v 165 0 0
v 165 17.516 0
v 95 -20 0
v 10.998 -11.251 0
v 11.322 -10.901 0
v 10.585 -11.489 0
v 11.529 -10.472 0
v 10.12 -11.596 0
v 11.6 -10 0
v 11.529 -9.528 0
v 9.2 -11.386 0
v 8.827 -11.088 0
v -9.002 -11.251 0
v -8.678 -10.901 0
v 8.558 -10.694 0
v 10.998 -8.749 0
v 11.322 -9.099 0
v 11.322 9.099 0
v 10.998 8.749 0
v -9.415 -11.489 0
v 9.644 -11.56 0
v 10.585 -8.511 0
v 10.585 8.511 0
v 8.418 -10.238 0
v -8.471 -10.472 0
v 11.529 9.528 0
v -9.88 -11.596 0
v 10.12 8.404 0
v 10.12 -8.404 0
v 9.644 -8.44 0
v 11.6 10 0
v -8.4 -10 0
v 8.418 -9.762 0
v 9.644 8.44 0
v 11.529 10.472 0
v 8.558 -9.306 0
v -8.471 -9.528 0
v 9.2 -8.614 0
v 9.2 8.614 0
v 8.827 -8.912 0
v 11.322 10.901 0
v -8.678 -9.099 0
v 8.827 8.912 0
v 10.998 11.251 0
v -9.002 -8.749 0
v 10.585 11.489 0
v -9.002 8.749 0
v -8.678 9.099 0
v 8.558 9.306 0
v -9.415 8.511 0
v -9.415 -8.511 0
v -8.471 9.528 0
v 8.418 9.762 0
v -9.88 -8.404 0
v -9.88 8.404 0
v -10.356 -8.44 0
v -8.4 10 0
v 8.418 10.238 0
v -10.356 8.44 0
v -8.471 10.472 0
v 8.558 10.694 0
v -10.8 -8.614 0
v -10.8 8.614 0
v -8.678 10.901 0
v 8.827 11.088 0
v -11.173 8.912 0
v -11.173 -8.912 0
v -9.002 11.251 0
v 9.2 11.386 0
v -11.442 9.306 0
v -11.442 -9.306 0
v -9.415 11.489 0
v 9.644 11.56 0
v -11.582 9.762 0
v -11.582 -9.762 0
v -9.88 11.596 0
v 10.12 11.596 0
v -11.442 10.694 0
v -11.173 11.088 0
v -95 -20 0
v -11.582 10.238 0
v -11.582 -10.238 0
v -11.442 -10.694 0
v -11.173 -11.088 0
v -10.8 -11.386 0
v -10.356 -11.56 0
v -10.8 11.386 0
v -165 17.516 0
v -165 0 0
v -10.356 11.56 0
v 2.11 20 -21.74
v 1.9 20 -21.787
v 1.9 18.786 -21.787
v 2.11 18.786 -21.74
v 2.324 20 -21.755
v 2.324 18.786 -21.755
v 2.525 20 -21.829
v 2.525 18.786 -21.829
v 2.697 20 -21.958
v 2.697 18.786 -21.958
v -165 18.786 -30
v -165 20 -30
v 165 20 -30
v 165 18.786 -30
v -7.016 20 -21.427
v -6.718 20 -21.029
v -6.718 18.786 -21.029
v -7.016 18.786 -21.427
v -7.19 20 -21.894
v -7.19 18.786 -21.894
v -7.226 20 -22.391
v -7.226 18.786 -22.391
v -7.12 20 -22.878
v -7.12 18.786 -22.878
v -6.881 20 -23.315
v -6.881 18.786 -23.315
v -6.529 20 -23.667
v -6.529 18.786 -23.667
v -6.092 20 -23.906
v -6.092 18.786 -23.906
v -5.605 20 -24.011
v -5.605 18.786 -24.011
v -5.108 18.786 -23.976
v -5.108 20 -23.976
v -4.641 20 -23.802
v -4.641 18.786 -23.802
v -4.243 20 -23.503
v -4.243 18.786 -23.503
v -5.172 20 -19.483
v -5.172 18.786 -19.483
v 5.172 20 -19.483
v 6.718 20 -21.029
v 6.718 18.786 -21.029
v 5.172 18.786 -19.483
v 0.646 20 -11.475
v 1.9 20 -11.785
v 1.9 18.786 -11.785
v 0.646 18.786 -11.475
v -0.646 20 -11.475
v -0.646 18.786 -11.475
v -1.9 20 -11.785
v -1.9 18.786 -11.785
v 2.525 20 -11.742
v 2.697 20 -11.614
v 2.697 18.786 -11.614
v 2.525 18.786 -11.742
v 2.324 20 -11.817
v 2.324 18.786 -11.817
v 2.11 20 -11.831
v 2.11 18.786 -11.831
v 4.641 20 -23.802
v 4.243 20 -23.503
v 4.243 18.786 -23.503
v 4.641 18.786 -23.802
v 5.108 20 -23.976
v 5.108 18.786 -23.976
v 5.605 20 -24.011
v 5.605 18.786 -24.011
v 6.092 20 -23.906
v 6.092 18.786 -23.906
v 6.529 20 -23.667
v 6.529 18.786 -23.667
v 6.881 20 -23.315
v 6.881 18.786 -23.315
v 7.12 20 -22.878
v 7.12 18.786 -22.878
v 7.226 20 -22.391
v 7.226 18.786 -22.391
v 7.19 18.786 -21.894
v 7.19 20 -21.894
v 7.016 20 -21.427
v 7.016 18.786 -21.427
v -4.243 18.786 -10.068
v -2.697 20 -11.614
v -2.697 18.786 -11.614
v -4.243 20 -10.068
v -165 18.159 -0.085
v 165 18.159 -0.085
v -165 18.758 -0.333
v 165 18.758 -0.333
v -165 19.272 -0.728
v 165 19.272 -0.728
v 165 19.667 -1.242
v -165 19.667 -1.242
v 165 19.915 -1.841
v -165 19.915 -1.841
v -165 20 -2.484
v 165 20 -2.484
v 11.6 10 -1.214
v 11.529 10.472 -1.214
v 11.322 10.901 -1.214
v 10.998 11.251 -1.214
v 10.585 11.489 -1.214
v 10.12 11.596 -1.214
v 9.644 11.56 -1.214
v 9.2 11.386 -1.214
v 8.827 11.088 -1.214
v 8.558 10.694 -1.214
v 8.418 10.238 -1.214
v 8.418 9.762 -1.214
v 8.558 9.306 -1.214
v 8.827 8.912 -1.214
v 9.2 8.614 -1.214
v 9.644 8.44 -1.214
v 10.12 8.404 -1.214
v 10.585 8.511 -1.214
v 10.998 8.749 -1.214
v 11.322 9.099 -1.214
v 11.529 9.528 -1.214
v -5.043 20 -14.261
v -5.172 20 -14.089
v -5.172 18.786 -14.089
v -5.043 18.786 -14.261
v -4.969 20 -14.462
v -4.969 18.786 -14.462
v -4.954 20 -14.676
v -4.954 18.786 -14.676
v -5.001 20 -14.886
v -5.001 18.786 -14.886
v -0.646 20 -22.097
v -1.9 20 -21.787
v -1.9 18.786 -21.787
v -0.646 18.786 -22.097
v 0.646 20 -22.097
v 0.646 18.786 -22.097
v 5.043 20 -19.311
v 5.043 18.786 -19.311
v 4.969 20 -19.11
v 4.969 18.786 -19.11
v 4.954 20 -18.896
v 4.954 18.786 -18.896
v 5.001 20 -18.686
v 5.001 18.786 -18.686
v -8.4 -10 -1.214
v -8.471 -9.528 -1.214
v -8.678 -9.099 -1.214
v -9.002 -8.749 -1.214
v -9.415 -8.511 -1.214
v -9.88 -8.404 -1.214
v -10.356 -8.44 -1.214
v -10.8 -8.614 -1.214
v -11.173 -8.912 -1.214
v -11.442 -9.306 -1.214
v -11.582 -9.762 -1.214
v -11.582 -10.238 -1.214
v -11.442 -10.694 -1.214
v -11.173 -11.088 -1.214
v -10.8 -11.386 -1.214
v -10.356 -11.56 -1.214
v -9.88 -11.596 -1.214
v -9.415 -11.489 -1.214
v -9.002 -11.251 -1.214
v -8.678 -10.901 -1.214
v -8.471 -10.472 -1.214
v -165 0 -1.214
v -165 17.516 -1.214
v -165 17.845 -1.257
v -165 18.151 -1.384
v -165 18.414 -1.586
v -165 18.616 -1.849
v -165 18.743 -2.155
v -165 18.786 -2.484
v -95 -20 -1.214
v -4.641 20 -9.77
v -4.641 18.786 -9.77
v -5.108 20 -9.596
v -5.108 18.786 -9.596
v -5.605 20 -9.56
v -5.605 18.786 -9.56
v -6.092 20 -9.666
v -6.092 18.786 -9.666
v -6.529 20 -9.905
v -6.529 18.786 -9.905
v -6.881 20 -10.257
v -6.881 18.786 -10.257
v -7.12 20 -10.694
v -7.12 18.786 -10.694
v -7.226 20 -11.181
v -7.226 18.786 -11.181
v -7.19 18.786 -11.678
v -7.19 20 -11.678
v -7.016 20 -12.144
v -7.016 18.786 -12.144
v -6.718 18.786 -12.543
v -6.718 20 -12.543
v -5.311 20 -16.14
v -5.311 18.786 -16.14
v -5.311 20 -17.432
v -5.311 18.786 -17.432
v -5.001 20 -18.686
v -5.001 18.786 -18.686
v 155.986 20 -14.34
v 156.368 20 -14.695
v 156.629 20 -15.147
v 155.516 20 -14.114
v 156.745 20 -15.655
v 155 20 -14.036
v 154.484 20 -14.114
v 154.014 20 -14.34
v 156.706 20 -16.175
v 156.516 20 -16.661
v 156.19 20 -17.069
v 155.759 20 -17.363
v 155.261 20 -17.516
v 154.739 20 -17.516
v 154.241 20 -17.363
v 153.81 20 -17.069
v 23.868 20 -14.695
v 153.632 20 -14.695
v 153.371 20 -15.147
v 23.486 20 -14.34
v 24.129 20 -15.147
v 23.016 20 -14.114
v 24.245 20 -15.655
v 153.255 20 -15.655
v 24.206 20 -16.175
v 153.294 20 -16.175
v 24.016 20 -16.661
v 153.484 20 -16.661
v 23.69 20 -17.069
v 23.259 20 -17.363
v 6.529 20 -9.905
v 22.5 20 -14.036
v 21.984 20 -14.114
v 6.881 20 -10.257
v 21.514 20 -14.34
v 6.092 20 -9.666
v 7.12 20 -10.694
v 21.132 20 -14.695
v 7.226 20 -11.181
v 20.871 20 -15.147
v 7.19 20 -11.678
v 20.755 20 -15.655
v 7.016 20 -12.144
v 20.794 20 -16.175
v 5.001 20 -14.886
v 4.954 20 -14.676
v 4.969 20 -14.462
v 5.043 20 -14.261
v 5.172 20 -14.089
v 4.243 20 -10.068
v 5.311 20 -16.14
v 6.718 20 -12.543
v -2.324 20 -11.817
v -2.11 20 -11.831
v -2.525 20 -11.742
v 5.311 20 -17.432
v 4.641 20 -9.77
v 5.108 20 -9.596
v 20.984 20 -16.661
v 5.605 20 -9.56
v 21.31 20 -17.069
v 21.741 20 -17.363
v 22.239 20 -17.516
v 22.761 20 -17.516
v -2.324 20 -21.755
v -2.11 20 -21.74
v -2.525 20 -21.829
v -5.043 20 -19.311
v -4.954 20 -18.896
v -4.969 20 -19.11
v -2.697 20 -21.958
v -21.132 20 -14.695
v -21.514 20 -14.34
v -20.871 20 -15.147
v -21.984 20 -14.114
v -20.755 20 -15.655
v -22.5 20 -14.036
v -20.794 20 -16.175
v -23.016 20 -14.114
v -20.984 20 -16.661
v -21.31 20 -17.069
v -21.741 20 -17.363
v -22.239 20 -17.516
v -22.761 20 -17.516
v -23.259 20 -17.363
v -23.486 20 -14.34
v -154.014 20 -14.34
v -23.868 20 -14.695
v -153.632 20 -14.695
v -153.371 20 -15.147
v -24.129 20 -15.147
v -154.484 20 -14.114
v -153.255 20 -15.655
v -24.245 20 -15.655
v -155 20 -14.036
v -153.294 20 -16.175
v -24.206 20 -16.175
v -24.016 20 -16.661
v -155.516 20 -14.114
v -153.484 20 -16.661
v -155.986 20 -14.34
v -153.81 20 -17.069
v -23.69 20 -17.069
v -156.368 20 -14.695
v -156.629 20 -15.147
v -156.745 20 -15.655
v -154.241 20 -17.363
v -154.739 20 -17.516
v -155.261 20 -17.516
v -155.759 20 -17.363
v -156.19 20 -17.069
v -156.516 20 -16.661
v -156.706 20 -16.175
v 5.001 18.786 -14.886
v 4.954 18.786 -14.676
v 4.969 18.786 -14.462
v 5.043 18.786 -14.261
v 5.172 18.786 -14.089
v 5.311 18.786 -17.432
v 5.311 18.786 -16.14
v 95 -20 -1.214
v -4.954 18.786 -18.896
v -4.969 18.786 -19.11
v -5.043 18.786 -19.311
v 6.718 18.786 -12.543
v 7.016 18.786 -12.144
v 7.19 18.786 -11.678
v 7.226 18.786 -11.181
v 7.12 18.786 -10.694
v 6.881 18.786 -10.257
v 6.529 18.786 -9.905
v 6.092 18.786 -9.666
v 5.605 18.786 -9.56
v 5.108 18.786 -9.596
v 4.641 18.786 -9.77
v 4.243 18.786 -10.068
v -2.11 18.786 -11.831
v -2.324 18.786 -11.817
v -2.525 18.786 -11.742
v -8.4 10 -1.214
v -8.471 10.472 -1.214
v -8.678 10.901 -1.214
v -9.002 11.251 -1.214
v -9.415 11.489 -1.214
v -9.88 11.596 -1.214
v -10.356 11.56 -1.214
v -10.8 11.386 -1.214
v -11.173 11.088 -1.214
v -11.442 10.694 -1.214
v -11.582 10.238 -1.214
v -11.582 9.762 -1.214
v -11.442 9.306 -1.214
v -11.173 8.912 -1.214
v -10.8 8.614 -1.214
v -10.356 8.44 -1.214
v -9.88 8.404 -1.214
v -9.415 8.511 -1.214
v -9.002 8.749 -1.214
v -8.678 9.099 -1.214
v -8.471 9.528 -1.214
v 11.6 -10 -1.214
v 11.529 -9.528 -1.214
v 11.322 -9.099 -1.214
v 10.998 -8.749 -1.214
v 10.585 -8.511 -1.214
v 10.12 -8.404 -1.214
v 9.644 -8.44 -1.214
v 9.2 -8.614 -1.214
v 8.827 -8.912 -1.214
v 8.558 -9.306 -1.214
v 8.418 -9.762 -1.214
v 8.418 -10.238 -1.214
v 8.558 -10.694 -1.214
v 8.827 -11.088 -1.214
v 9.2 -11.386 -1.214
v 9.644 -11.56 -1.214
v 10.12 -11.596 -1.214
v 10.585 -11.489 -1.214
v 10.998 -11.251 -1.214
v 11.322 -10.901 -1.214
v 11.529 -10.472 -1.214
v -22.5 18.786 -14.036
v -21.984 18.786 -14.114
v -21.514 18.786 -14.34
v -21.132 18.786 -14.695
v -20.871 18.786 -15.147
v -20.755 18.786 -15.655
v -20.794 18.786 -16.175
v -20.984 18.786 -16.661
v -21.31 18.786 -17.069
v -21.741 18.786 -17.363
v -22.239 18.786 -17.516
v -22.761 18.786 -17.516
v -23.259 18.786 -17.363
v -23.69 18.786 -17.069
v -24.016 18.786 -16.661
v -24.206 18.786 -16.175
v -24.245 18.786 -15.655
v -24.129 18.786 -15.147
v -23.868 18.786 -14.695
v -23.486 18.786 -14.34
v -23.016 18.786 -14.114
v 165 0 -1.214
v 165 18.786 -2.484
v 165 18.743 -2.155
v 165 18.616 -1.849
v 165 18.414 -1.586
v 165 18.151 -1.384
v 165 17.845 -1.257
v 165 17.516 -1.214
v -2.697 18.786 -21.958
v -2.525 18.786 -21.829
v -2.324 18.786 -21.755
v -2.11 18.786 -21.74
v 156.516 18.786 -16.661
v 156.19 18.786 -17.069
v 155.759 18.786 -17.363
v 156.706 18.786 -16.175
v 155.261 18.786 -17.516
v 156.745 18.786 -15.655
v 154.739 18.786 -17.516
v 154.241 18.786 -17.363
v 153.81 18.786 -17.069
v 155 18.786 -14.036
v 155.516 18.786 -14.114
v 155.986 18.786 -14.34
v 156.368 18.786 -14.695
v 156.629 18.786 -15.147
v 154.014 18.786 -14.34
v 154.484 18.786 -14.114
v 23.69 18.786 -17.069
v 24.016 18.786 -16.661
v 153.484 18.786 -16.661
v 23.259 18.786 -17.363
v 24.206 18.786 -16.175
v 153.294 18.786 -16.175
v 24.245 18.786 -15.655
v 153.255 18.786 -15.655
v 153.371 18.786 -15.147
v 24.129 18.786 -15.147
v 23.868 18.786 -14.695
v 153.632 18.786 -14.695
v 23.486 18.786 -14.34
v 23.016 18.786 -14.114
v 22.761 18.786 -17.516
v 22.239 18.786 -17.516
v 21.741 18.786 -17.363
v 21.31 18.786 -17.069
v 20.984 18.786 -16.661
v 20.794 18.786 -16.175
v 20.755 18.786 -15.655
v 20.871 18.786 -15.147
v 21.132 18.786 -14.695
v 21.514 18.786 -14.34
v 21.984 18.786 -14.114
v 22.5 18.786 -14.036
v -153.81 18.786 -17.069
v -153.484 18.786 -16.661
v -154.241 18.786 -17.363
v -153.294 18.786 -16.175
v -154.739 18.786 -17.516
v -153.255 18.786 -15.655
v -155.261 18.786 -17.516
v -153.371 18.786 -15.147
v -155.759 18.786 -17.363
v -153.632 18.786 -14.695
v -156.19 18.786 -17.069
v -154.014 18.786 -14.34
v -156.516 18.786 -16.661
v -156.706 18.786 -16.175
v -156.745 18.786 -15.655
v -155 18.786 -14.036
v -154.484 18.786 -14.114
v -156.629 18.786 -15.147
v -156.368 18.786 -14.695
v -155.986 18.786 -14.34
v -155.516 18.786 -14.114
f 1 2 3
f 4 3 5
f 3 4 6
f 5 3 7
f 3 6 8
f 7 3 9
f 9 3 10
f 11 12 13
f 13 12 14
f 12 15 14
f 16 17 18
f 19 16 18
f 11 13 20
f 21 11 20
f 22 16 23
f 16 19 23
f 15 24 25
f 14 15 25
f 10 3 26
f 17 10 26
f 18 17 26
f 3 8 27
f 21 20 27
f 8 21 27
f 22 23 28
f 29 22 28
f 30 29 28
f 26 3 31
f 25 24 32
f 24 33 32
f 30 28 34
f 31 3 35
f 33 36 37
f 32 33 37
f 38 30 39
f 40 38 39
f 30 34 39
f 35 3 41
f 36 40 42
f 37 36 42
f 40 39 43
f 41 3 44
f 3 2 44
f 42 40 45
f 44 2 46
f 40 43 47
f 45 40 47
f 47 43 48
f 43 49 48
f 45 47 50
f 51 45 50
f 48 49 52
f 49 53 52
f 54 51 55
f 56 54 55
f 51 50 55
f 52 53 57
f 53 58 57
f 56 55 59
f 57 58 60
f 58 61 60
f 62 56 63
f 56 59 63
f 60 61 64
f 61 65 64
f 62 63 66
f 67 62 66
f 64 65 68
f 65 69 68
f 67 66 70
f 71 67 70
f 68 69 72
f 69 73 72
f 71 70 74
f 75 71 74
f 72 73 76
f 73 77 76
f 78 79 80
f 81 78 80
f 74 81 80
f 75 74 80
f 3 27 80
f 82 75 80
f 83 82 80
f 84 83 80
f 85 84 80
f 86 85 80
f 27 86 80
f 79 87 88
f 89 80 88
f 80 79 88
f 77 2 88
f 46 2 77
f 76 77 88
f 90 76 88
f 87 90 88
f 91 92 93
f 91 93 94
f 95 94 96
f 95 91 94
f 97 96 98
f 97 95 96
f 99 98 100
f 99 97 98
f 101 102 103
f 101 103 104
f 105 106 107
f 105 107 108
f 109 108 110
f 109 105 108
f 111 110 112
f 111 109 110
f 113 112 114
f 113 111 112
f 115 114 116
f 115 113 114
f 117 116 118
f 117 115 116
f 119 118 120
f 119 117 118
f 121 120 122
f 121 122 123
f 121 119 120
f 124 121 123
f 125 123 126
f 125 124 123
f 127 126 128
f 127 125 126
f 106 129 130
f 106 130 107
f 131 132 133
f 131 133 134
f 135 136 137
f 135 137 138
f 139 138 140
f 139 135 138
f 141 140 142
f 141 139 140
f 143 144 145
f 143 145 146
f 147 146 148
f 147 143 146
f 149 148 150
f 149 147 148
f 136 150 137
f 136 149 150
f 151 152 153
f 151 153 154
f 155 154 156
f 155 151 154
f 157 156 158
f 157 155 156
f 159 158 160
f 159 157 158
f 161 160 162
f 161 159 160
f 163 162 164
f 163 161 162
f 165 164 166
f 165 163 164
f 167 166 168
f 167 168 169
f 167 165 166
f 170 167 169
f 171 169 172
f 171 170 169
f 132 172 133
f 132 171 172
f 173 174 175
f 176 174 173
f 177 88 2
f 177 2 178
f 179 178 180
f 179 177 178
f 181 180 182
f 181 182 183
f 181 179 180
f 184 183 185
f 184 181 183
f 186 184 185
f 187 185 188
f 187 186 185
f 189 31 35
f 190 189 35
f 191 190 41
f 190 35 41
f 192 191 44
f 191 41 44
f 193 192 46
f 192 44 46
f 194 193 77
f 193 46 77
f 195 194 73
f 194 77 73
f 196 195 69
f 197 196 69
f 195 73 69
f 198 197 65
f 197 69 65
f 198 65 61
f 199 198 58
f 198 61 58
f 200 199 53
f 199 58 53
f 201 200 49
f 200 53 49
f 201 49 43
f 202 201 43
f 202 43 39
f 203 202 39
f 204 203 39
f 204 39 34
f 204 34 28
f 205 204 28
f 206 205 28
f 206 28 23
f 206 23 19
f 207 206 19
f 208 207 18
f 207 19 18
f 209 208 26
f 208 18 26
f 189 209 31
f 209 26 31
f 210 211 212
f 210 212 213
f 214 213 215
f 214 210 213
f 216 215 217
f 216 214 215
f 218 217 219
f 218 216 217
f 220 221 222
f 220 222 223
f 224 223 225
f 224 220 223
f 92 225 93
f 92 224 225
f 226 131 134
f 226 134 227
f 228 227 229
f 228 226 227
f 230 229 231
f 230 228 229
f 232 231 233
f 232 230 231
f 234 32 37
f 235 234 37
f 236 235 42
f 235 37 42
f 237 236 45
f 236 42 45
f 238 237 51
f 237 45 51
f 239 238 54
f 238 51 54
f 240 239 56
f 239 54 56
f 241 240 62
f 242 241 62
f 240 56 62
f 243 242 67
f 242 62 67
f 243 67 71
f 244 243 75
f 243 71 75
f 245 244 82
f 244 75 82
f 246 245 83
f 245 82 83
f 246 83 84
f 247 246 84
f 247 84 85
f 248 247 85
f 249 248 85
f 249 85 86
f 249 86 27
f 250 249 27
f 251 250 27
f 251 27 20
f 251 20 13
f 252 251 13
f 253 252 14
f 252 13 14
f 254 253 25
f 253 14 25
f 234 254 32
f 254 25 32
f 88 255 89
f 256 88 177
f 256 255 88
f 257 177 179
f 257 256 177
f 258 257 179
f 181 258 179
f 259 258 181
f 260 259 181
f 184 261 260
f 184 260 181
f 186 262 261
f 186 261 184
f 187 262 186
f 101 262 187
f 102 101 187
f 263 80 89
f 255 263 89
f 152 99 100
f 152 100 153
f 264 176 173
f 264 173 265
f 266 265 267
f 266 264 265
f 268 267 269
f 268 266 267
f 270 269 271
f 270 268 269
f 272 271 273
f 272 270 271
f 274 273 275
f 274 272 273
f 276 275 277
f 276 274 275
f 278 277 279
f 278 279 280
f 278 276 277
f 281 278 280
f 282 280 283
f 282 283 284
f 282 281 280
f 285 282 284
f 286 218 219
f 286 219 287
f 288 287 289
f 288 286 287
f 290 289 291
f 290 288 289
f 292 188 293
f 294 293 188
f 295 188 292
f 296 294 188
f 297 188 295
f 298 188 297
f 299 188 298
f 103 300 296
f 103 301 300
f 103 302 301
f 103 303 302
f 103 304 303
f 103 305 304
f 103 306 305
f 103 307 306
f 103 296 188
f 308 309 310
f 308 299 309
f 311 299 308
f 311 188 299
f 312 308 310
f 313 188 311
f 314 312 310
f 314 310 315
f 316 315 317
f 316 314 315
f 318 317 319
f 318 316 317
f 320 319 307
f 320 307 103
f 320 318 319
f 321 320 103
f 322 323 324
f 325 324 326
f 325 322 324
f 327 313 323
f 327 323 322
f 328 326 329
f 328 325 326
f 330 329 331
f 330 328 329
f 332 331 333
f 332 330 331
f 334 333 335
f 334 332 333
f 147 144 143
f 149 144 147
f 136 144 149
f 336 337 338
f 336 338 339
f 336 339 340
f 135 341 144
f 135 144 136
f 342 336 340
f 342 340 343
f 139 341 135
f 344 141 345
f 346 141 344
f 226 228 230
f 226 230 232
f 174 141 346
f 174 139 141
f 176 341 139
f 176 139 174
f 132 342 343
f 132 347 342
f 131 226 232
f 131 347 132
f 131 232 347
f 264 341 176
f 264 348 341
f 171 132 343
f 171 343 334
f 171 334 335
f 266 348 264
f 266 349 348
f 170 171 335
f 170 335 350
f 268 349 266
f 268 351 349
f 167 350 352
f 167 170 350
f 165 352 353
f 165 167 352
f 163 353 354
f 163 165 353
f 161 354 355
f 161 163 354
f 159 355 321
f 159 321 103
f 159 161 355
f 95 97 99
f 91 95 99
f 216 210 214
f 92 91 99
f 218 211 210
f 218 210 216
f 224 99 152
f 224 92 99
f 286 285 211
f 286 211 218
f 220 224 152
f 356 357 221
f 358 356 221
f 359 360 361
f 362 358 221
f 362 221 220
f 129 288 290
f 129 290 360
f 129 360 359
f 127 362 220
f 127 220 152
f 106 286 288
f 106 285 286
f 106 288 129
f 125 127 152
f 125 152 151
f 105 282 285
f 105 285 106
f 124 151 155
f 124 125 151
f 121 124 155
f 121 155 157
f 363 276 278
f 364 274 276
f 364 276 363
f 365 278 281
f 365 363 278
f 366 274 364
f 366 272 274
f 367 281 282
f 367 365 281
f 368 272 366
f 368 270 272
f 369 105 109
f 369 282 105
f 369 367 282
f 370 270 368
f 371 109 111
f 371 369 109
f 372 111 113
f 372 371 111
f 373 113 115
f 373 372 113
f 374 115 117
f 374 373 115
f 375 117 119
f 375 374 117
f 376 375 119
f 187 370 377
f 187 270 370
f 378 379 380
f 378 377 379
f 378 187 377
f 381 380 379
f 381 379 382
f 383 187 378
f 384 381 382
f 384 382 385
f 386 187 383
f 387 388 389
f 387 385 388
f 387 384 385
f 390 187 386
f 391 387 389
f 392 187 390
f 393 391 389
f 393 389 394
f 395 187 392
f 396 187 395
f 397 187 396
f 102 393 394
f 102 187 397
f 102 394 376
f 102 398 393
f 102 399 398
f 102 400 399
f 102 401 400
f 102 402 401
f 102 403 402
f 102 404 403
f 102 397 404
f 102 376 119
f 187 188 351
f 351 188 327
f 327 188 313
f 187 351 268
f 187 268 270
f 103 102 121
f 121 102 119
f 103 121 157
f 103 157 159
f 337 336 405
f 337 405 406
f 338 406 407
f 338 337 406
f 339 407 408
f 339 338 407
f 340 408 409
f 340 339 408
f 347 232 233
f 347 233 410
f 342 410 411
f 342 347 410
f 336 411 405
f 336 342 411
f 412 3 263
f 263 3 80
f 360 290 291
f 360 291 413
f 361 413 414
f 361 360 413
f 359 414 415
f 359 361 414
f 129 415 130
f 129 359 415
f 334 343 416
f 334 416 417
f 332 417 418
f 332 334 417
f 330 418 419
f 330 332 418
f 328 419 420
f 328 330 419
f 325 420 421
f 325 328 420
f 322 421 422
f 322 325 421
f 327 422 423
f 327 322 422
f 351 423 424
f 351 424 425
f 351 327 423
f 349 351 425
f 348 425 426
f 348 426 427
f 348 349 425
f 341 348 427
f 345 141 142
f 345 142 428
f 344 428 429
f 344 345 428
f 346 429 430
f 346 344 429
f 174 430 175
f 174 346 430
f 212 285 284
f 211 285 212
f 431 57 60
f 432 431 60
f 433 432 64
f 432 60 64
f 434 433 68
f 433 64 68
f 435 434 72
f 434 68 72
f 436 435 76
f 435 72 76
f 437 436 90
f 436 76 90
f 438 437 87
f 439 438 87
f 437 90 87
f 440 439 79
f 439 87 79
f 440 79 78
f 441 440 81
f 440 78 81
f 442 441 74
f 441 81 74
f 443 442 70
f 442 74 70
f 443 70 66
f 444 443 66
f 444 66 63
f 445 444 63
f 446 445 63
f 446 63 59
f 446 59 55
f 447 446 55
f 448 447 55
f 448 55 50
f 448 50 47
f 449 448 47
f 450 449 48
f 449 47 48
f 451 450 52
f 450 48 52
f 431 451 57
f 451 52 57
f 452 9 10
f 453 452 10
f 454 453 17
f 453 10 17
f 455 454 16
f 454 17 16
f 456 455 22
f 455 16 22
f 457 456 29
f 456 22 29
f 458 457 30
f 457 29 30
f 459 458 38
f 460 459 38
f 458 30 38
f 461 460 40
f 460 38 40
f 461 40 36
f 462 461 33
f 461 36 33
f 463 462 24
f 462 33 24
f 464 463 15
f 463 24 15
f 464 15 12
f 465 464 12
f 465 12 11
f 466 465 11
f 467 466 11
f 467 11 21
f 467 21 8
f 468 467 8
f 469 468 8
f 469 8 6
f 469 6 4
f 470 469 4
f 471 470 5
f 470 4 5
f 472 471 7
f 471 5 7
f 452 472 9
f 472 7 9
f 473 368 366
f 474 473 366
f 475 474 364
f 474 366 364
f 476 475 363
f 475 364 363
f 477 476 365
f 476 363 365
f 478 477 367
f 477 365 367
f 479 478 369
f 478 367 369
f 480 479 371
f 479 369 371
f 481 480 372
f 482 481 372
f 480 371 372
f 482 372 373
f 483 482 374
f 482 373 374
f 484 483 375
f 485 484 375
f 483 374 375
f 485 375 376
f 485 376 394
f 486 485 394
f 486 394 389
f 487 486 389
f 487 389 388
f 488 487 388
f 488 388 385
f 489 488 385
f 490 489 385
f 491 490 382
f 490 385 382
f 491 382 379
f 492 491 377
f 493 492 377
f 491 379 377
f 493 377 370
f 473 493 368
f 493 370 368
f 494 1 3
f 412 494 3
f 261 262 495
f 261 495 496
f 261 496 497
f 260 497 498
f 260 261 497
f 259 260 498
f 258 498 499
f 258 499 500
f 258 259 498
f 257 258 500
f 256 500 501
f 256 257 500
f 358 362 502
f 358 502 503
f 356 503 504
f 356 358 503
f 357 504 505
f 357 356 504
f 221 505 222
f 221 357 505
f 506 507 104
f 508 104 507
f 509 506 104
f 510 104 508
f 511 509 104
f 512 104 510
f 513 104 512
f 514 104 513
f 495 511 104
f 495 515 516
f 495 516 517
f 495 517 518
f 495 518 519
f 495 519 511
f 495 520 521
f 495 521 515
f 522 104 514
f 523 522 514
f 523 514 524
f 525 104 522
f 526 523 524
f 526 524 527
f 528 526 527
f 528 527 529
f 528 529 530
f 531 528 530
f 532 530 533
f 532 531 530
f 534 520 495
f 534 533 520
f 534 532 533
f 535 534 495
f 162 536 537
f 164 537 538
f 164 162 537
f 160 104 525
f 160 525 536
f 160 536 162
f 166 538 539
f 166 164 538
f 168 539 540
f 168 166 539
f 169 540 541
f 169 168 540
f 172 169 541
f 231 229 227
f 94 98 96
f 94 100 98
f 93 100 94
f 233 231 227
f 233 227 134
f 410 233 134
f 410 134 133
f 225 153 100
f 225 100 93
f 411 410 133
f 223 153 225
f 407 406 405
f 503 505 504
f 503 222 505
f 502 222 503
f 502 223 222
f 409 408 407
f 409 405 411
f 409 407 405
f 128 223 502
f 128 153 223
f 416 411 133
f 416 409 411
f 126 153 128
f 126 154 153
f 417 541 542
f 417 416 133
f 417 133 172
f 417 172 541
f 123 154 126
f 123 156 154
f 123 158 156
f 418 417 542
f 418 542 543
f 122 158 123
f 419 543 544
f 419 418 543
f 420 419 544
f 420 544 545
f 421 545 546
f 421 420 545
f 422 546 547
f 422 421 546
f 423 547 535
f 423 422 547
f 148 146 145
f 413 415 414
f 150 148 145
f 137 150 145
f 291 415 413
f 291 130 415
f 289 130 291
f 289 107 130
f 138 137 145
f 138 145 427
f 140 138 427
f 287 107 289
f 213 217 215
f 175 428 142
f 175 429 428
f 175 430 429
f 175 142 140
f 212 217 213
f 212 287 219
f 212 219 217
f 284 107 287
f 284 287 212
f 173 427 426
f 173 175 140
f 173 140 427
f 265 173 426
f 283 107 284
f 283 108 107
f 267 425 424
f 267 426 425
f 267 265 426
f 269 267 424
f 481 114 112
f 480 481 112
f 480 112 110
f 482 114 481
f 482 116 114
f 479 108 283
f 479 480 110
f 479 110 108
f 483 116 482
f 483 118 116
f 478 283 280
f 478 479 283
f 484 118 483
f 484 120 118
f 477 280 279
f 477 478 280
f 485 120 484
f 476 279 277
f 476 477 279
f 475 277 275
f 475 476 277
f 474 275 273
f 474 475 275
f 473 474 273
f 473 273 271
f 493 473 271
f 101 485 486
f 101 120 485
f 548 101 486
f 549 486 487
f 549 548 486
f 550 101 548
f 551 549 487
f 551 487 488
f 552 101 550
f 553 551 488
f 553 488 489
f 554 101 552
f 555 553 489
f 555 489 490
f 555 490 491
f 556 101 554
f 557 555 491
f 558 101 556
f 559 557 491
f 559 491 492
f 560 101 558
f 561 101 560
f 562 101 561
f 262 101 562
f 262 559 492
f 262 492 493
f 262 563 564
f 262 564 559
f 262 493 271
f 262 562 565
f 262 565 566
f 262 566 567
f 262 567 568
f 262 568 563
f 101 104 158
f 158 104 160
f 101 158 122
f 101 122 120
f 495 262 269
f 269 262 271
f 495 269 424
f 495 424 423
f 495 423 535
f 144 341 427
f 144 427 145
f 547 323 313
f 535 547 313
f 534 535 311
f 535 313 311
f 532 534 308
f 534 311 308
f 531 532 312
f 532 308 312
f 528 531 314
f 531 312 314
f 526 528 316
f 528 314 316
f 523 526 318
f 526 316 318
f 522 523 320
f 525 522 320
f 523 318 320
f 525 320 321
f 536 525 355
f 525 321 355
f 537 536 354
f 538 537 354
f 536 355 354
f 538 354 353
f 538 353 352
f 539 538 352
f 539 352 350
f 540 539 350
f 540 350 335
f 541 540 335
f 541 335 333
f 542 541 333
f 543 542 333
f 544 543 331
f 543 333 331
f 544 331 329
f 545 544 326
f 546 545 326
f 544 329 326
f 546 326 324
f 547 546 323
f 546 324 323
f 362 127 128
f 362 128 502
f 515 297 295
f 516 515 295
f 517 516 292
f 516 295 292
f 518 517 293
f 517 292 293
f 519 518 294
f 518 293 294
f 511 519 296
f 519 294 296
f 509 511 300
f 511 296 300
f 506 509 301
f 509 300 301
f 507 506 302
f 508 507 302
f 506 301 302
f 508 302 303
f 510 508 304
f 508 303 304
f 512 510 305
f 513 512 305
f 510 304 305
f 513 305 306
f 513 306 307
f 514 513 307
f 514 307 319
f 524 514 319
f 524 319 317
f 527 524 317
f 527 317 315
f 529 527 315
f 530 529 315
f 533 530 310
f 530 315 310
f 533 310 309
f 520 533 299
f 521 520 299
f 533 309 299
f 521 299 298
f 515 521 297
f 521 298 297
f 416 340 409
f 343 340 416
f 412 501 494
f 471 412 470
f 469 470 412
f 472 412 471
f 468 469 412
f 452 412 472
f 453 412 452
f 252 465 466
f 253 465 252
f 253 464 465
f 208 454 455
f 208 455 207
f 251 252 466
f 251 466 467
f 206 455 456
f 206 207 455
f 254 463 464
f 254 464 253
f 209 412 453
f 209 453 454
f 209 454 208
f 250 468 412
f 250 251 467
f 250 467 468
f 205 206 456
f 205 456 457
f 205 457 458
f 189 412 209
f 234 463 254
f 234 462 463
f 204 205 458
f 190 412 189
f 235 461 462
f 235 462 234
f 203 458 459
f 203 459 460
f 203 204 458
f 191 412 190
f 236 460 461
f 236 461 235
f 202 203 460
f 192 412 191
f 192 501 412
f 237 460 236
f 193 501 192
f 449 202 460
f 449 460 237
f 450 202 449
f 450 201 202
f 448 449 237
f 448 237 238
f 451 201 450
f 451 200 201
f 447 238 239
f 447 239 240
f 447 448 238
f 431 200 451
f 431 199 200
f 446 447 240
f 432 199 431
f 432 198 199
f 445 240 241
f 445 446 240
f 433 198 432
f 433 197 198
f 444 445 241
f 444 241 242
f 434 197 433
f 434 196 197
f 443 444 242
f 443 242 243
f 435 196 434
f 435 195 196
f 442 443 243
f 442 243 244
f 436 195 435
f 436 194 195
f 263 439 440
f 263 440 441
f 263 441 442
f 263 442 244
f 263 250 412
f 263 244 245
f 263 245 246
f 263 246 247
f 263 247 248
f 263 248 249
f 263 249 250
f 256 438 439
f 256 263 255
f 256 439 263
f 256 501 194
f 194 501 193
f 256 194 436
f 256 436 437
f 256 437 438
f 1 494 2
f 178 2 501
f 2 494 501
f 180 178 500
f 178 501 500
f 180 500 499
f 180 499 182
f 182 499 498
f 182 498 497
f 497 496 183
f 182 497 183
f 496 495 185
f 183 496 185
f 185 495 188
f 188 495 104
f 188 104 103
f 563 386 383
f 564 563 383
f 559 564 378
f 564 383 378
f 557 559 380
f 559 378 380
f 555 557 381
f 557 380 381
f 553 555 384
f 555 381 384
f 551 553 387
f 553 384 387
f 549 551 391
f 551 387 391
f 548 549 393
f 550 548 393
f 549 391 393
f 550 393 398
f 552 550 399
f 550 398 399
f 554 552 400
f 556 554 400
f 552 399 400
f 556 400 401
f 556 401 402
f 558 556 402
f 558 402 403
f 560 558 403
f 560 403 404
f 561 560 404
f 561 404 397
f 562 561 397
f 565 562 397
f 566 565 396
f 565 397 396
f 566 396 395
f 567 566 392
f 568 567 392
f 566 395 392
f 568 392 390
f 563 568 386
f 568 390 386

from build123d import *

# Parameters (mm, degrees)
SKETCH2_R                    = 1.6
BASE_FLANGE1_DEPTH           = 1.21412
EDGE_FLANGE1_STRIP_W         = 7.39648
EDGE_FLANGE1_STRIP_H         = 1.21412
EDGE_FLANGE1_STRIP_CUT_DEPTH = 330
EDGE_FLANGE1_DEPTH           = 330
CUT_EXTRUDE1_DEPTH           = 1.21412
SKETCH11_R                   = 1.75
CUT_EXTRUDE2_DEPTH           = 1.21412


# Sheet-metal steps are written as plain solids
with BuildPart() as part:
    # Sketch2 → Base-Flange1 (new body)
    with BuildSketch(Plane.XY):
        Polygon((-165, 0), (-165, 20), (165, 20), (165, 0), (95, -20), (-95, -20), align=None)
        with Locations((-10, 10)):
            Circle(SKETCH2_R, mode=Mode.SUBTRACT)
        with Locations((10, 10)):
            Circle(SKETCH2_R, mode=Mode.SUBTRACT)
        with Locations((10, -10)):
            Circle(SKETCH2_R, mode=Mode.SUBTRACT)
        with Locations((-10, -10)):
            Circle(SKETCH2_R, mode=Mode.SUBTRACT)
    extrude(amount=-BASE_FLANGE1_DEPTH)

    # Edge-Flange1 strip (across the edge) → Edge-Flange1 strip cut (cut)
    with BuildSketch(Plane(origin=(-165, 20, -1.21412), x_dir=(0, -1, 0), z_dir=(1, 0, 0))):
        with Locations((-1.21412, -0.60706)):
            Rectangle(EDGE_FLANGE1_STRIP_W, EDGE_FLANGE1_STRIP_H)
    extrude(amount=EDGE_FLANGE1_STRIP_CUT_DEPTH, mode=Mode.SUBTRACT)

    # Edge-Flange1 section (across the edge) → Edge-Flange1 (add)
    with BuildSketch(Plane(origin=(-165, 20, -1.21412), x_dir=(0, -1, 0), z_dir=(1, 0, 0))):
        with BuildLine():
            Line((0, 1.27), (0, 28.78588))
            Line((0, 28.78588), (1.21412, 28.78588))
            Line((1.21412, 28.78588), (1.21412, 1.27))
            ThreePointArc((1.21412, 1.27), (1.586094388, 0.371974388), (2.48412, 0))
            Line((2.48412, 0), (2.48412, -1.21412))
            ThreePointArc((2.48412, -1.21412), (0.727581903, -0.486538097), (0, 1.27))
        make_face()
    extrude(amount=EDGE_FLANGE1_DEPTH)

    # Sketch10 → Cut-Extrude1 (cut)
    with BuildSketch(Plane(origin=(0, 20, 0), x_dir=(1, 0, 0), z_dir=(0, 1, 0))):
        with BuildLine():
            Line((6.717514421, 21.028520687), (5.171899982, 19.482906248))
            ThreePointArc((5.171899982, 19.482906248), (4.968885146, 19.109755124), (5.001136207, 18.686179093))
            ThreePointArc((5.001136207, 18.686179093), (5.35, 16.78588), (5.001136207, 14.885580908))
            ThreePointArc((5.001136207, 14.885580908), (4.968885146, 14.462004877), (5.171899982, 14.088853753))
            Line((5.171899982, 14.088853753), (6.717514421, 12.543239313))
            ThreePointArc((6.717514421, 12.543239313), (6.717514421, 10.068365579), (4.242640687, 10.068365579))
            Line((4.242640687, 10.068365579), (2.697026248, 11.613980018))
            ThreePointArc((2.697026248, 11.613980018), (2.323875124, 11.816994854), (1.900299093, 11.784743793))
            ThreePointArc((1.900299093, 11.784743793), (0, 11.43588), (-1.900299092, 11.784743793))
            ThreePointArc((-1.900299092, 11.784743793), (-2.323875123, 11.816994854), (-2.697026247, 11.613980018))
            Line((-2.697026247, 11.613980018), (-4.242640687, 10.068365579))
            ThreePointArc((-4.242640687, 10.068365579), (-6.717514421, 10.068365579), (-6.717514421, 12.543239313))
            Line((-6.717514421, 12.543239313), (-5.171899982, 14.088853753))
            ThreePointArc((-5.171899982, 14.088853753), (-4.968885146, 14.462004877), (-5.001136207, 14.885580908))
            ThreePointArc((-5.001136207, 14.885580908), (-5.35, 16.78588), (-5.001136207, 18.686179093))
            ThreePointArc((-5.001136207, 18.686179093), (-4.968885146, 19.109755124), (-5.171899982, 19.482906248))
            Line((-5.171899982, 19.482906248), (-6.717514421, 21.028520687))
            ThreePointArc((-6.717514421, 21.028520687), (-6.717514421, 23.503394421), (-4.242640687, 23.503394421))
            Line((-4.242640687, 23.503394421), (-2.697026247, 21.957779982))
            ThreePointArc((-2.697026247, 21.957779982), (-2.323875123, 21.754765146), (-1.900299092, 21.787016207))
            ThreePointArc((-1.900299092, 21.787016207), (0, 22.13588), (1.900299093, 21.787016207))
            ThreePointArc((1.900299093, 21.787016207), (2.323875124, 21.754765146), (2.697026248, 21.957779982))
            Line((2.697026248, 21.957779982), (4.242640687, 23.503394421))
            ThreePointArc((4.242640687, 23.503394421), (6.717514421, 23.503394421), (6.717514421, 21.028520687))
        make_face()
    extrude(amount=-CUT_EXTRUDE1_DEPTH, mode=Mode.SUBTRACT)

    # Sketch11 → Cut-Extrude2 (cut)
    with BuildSketch(Plane(origin=(0, 20, 0), x_dir=(1, 0, 0), z_dir=(0, 1, 0))):
        with Locations(Location((-155, 15.78588, 0), (0, 0, 270))):
            Circle(SKETCH11_R)
        with Locations(Location((-22.5, 15.78588, 0), (0, 0, 270))):
            Circle(SKETCH11_R)
        with Locations(Location((22.5, 15.78588, 0), (0, 0, 270))):
            Circle(SKETCH11_R)
        with Locations(Location((155, 15.78588, 0), (0, 0, 270))):
            Circle(SKETCH11_R)
    extrude(amount=-CUT_EXTRUDE2_DEPTH, mode=Mode.SUBTRACT)


solid = part.part
